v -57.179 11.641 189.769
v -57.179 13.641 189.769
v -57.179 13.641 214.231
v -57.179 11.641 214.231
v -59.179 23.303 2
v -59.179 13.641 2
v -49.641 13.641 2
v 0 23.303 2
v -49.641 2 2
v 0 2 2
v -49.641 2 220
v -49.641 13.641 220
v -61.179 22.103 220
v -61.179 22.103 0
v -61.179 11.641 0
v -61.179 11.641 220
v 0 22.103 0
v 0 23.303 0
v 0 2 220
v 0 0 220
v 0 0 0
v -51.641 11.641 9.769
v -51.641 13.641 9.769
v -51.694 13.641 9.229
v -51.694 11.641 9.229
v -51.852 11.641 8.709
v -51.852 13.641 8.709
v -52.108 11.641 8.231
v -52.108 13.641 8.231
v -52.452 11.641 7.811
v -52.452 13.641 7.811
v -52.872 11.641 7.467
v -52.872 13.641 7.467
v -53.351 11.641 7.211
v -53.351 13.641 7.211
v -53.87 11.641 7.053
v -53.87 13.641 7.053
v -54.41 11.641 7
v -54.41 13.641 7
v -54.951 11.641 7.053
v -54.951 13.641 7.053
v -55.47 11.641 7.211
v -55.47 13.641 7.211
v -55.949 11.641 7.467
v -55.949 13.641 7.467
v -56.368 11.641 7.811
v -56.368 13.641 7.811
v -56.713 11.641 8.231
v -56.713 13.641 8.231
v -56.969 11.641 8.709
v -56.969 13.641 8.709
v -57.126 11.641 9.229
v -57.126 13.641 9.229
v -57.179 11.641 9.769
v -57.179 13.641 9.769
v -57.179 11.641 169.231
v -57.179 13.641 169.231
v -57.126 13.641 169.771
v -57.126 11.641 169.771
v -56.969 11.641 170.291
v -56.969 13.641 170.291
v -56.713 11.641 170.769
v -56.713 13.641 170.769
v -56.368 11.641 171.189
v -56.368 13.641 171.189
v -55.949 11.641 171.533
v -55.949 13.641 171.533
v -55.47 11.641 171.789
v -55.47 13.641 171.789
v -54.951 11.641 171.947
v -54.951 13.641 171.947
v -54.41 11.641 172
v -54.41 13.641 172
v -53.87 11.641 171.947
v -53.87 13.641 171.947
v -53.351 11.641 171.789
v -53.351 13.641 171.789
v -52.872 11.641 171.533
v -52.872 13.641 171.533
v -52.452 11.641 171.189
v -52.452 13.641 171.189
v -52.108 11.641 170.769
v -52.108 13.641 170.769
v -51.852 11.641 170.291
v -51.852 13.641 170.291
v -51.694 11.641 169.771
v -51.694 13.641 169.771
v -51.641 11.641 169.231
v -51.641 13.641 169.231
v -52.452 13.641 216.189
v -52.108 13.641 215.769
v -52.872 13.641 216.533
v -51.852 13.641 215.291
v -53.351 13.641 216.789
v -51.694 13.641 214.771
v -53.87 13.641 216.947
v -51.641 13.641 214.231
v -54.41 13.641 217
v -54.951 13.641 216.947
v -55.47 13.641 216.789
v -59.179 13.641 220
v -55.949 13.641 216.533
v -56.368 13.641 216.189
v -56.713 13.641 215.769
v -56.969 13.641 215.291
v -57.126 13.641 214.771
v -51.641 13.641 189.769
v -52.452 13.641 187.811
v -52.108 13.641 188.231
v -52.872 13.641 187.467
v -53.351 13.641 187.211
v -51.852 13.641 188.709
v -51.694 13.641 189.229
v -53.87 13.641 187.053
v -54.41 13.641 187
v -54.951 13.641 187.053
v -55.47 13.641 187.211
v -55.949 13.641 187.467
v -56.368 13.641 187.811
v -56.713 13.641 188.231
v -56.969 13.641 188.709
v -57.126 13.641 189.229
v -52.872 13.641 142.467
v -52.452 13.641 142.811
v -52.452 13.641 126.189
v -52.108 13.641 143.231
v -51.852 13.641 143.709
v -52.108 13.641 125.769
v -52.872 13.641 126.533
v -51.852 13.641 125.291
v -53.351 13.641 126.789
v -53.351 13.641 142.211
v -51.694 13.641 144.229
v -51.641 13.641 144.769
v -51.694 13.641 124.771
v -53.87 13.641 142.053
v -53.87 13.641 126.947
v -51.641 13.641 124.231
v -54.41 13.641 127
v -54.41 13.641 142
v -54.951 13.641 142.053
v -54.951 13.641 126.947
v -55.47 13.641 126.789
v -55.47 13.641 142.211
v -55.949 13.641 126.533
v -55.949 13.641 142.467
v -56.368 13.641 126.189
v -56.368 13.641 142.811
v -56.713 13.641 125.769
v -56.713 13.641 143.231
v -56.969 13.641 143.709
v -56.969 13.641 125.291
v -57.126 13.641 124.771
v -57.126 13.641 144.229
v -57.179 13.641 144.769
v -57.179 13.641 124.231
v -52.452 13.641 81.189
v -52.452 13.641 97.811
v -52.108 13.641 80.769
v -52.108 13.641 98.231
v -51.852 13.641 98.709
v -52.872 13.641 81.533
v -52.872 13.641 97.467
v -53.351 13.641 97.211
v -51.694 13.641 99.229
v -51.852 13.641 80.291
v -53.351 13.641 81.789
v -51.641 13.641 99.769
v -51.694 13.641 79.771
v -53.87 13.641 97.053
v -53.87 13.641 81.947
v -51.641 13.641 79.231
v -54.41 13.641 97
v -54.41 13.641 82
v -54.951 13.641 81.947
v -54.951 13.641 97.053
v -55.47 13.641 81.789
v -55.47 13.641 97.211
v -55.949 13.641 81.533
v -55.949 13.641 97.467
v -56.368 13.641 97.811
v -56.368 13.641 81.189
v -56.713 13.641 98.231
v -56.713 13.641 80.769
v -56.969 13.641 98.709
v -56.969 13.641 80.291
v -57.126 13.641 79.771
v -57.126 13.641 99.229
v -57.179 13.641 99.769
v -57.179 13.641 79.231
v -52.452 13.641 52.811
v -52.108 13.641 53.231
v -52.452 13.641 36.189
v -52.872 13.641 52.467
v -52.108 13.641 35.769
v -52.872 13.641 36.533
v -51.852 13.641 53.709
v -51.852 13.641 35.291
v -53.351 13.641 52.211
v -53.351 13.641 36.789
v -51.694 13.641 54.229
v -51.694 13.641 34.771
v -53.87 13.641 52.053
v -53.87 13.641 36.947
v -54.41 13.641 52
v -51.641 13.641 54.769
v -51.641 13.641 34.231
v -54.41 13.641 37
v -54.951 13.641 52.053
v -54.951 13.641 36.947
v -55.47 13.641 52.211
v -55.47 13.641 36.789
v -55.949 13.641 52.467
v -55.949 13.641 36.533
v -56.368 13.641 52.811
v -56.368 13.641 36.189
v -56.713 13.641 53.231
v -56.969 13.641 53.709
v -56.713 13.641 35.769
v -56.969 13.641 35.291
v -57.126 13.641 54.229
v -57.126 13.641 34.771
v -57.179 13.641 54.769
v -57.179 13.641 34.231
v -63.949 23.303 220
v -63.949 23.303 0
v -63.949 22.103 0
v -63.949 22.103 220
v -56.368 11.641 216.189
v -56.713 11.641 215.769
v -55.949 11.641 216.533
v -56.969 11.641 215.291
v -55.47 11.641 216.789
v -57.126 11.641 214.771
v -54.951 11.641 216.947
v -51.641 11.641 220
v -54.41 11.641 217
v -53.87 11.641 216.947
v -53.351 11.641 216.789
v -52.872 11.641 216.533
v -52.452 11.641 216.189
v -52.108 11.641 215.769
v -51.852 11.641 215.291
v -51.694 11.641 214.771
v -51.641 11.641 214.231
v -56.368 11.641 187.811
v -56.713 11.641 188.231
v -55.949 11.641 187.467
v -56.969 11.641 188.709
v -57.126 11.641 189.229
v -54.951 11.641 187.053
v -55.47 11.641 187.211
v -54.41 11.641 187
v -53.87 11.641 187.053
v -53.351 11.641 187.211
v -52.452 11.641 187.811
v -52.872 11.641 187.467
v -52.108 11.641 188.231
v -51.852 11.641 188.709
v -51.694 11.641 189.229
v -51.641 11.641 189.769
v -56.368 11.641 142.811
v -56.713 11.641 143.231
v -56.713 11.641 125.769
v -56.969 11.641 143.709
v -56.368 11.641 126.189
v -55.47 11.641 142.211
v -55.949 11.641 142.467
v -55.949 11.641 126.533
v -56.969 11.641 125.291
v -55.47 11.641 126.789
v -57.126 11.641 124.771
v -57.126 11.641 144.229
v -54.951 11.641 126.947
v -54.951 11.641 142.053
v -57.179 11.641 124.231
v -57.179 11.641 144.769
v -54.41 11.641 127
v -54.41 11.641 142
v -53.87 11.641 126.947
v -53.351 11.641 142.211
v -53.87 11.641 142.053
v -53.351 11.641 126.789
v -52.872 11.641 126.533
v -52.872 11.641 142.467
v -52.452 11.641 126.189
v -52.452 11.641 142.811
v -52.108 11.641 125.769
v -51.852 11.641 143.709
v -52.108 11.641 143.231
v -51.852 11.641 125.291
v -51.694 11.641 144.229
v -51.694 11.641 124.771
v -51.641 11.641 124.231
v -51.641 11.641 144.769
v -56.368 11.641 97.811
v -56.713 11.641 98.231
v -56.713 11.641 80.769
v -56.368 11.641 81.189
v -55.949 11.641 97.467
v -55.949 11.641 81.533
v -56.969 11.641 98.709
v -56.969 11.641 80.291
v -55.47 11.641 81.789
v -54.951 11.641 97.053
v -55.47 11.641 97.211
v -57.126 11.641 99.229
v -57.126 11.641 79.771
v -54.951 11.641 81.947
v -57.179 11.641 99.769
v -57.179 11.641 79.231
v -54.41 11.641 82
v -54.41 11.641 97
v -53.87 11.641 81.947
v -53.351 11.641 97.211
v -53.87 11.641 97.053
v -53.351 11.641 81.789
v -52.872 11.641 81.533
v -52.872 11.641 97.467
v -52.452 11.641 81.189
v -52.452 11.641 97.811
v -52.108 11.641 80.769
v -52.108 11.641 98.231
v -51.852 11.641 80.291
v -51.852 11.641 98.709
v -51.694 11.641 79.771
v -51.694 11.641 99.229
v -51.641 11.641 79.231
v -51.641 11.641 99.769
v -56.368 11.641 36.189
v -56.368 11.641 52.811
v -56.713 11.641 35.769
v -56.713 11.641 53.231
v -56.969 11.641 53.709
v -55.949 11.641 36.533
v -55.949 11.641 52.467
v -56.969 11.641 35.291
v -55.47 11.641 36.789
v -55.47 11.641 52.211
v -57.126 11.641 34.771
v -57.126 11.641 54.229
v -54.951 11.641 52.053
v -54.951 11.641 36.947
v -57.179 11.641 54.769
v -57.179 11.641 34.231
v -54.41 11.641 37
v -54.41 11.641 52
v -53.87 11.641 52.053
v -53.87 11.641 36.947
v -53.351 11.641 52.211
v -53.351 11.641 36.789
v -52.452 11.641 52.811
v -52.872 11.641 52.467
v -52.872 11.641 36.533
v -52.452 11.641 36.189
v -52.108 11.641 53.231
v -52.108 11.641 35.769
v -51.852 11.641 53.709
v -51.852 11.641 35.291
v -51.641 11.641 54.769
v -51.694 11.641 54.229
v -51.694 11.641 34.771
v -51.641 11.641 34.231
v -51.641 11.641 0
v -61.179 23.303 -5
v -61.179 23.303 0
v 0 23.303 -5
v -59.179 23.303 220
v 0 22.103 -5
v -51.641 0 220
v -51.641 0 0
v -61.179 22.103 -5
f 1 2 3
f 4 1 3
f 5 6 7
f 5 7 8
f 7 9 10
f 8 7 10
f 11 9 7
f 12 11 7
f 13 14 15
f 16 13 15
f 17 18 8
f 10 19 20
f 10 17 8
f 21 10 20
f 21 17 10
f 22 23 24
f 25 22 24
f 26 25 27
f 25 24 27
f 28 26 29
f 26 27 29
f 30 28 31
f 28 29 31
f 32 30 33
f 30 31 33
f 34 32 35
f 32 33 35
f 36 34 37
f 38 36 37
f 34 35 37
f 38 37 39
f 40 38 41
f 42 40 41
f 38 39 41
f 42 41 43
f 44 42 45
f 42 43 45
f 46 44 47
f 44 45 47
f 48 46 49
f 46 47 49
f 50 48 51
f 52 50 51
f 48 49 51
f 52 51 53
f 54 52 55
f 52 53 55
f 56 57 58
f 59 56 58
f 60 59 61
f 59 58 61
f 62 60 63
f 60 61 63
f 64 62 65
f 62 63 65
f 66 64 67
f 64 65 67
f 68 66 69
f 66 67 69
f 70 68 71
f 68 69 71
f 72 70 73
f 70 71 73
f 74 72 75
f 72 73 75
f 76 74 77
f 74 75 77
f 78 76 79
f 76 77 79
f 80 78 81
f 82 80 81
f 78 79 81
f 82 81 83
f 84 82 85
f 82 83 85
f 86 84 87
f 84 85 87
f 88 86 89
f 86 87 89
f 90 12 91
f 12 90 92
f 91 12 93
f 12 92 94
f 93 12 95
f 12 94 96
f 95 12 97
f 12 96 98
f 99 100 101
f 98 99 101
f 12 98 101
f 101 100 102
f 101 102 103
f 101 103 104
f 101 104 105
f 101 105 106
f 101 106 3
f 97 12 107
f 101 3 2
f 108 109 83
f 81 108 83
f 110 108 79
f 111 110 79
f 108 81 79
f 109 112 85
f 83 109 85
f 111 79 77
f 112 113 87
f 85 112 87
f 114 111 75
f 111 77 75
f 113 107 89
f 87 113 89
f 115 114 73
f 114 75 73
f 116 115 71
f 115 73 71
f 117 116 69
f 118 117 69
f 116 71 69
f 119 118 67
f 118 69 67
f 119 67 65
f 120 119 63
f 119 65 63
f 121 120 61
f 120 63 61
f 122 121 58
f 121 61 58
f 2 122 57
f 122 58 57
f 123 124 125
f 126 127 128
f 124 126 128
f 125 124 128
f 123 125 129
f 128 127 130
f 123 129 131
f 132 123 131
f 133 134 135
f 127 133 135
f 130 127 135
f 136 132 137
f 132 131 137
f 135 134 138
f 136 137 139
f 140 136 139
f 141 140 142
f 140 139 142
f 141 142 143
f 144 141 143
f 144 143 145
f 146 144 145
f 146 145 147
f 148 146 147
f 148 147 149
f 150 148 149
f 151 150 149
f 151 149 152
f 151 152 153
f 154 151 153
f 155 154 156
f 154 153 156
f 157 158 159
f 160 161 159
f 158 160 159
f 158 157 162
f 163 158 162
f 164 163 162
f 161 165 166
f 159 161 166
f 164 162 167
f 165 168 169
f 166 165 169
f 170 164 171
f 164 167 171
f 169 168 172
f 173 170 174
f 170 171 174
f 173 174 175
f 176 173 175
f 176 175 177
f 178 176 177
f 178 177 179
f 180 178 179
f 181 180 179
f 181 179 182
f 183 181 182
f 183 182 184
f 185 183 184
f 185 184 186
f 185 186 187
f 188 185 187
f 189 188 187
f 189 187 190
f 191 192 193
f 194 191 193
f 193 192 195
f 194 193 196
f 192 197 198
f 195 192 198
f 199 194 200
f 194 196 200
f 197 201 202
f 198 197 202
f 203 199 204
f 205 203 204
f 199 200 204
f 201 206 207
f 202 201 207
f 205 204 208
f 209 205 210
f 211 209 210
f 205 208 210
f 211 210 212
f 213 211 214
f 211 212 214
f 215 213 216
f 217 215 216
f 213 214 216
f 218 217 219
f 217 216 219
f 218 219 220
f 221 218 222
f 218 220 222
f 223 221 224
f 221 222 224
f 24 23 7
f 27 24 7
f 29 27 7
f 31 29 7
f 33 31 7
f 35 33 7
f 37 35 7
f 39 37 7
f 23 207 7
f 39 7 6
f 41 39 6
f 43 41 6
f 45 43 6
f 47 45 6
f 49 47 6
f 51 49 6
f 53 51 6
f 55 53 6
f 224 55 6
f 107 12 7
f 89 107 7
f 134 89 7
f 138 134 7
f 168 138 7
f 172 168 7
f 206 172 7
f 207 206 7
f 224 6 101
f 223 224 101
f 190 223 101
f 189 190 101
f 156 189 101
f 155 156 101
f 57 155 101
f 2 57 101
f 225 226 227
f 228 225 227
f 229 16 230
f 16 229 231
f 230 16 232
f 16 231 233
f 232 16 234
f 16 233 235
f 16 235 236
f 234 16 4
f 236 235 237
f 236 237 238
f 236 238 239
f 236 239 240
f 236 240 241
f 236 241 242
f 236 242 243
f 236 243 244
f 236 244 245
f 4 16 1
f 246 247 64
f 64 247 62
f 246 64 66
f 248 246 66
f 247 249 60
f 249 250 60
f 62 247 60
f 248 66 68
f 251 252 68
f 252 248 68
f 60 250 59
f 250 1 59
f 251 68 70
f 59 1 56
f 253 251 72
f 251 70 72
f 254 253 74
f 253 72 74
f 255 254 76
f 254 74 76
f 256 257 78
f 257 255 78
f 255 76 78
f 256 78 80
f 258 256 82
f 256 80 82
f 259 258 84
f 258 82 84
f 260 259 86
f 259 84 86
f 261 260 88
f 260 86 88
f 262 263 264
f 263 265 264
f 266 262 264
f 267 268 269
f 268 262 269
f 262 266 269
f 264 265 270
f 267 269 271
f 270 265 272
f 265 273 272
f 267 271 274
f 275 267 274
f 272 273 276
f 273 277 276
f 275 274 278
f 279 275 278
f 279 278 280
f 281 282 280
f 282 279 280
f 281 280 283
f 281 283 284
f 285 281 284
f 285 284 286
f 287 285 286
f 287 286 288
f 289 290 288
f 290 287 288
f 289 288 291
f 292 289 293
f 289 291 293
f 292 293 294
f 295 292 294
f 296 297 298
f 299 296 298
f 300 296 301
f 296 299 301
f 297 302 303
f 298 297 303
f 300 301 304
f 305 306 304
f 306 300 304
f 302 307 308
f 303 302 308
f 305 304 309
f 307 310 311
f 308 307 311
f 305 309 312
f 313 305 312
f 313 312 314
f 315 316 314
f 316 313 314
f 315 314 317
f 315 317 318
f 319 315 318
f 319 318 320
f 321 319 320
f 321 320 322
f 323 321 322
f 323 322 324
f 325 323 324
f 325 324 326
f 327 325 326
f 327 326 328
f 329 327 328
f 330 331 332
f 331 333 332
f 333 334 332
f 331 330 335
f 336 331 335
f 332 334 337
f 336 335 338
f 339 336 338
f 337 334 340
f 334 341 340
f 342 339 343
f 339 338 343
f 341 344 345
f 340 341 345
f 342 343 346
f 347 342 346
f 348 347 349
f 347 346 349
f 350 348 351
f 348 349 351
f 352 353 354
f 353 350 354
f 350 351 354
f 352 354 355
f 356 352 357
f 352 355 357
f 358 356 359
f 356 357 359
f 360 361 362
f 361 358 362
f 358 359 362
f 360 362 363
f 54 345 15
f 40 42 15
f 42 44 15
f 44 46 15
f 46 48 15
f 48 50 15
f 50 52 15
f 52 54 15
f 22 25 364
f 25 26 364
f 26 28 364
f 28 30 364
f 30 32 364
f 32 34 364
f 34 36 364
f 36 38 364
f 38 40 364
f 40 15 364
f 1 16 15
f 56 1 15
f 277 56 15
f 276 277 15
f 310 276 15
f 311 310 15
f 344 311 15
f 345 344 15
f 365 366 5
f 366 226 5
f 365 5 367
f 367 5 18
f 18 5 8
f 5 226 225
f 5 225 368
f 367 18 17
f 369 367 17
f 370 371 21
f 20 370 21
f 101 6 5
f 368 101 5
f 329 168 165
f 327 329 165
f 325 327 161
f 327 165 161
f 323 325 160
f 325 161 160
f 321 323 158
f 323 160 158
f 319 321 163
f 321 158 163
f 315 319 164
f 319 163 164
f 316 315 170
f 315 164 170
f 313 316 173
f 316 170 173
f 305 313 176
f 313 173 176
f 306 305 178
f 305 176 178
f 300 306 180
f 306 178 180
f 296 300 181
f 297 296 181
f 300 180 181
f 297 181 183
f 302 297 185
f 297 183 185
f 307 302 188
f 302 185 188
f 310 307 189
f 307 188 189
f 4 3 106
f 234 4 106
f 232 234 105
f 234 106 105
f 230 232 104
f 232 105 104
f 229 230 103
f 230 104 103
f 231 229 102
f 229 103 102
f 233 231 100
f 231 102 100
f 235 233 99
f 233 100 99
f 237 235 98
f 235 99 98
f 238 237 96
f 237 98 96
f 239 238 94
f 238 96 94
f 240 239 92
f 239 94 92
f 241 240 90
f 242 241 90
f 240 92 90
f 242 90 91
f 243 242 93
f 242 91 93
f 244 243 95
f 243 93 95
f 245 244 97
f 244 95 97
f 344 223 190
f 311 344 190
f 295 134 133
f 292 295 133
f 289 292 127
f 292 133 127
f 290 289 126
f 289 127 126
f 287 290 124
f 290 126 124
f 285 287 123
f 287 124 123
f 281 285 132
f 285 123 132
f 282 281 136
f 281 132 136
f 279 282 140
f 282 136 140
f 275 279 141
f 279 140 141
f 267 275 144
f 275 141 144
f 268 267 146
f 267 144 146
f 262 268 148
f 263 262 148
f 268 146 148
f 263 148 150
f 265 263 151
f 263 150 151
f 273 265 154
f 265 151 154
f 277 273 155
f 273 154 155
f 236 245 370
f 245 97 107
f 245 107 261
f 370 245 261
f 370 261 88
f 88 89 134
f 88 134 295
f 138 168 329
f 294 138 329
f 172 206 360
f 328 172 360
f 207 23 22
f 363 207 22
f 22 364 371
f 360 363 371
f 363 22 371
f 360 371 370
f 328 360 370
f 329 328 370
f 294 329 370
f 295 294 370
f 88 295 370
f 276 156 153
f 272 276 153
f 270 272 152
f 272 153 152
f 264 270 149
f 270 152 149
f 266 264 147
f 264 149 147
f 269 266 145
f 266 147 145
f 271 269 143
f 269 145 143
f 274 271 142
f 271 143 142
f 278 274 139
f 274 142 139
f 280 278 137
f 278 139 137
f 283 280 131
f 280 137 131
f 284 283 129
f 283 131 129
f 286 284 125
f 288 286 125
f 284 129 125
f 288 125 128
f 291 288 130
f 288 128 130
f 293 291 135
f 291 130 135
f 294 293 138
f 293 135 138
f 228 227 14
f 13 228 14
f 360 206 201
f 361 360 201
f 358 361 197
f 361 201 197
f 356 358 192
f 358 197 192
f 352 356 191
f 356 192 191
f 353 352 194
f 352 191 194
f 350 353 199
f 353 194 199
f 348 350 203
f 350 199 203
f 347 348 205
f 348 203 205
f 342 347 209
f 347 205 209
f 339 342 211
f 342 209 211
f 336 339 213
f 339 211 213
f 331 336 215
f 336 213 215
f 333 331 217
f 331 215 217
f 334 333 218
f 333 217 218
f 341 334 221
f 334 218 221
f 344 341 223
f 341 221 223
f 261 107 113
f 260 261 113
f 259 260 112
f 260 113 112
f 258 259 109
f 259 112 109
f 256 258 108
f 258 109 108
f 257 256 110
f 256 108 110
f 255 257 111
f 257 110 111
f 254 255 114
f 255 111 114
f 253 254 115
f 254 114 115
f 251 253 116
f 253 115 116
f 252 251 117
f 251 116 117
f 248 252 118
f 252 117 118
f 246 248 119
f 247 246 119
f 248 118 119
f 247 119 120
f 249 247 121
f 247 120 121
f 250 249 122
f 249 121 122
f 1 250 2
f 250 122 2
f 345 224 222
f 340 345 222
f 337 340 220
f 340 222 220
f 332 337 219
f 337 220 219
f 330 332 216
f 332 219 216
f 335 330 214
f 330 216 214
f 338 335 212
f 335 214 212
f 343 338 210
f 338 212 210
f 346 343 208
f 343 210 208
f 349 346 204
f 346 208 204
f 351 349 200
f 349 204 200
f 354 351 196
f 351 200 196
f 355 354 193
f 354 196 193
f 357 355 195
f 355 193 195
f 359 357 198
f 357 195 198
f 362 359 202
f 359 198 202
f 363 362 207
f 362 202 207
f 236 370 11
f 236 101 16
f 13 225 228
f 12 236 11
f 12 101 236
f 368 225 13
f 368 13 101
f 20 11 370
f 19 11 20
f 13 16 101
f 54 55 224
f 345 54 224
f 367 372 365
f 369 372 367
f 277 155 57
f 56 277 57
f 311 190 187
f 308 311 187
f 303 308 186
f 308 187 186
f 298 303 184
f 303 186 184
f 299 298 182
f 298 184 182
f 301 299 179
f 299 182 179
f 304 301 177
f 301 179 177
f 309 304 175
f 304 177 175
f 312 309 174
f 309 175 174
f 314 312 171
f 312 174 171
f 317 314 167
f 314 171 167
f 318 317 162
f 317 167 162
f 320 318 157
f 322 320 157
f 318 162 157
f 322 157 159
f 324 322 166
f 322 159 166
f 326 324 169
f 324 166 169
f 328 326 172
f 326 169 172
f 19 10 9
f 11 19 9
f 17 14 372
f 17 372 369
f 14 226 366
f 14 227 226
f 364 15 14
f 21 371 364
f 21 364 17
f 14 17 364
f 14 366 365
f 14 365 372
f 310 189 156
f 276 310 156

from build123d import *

# Parameters (mm, degrees)
F1_DEPTH = 220
F3_DEPTH = 2
F5_DEPTH = 2
F6_W     = 61.179483
F6_H     = 1.2
F7_DEPTH = 5


with BuildPart() as f1:
    # F0 (on Top) → F1 (new body)
    with BuildSketch(Plane.XY):
        Polygon((-51.641022, 0), (0, 0), (0, 2), (-49.641022, 2), (-49.641022, 13.641025), (-59.179483, 13.641025), (-59.179483, 23.302566), (-63.948719, 23.302566), (-63.948719, 22.102566), (-61.179483, 22.102566), (-61.179483, 11.641025), (-51.641022, 11.641025), align=None)
    extrude(amount=F1_DEPTH)

    # F2 (on face) → F3 (cut, through all)
    with BuildSketch(Plane(origin=(0, 13.641025, 0), x_dir=(-1, 0, 0), z_dir=(0, 1, 0))):
        with BuildLine():
            Line((57.179483, 189.76923), (57.179483, 214.23077))
            ThreePointArc((57.179483, 214.23077), (54.410253, 217), (51.641022, 214.23077))
            Line((51.641022, 214.23077), (51.641022, 189.76923))
            ThreePointArc((51.641022, 189.76923), (54.410253, 187), (57.179483, 189.76923))
        make_face()
        with BuildLine():
            Line((57.179483, 144.76923), (57.179483, 169.23077))
            ThreePointArc((57.179483, 169.23077), (54.410253, 172), (51.641022, 169.23077))
            Line((51.641022, 169.23077), (51.641022, 144.76923))
            ThreePointArc((51.641022, 144.76923), (54.410253, 142), (57.179483, 144.76923))
        make_face()
        with BuildLine():
            Line((57.179483, 99.76923), (57.179483, 124.23077))
            ThreePointArc((57.179483, 124.23077), (54.410253, 127), (51.641022, 124.23077))
            Line((51.641022, 124.23077), (51.641022, 99.76923))
            ThreePointArc((51.641022, 99.76923), (54.410253, 97), (57.179483, 99.76923))
        make_face()
        with BuildLine():
            Line((57.179483, 54.76923), (57.179483, 79.23077))
            ThreePointArc((57.179483, 79.23077), (54.410253, 82), (51.641022, 79.23077))
            Line((51.641022, 79.23077), (51.641022, 54.76923))
            ThreePointArc((51.641022, 54.76923), (54.410253, 52), (57.179483, 54.76923))
        make_face()
        with BuildLine():
            Line((57.179483, 9.76923), (57.179483, 34.23077))
            ThreePointArc((57.179483, 34.23077), (54.410253, 37), (51.641022, 34.23077))
            Line((51.641022, 34.23077), (51.641022, 9.76923))
            ThreePointArc((51.641022, 9.76923), (54.410253, 7), (57.179483, 9.76923))
        make_face()
    extrude(amount=-F3_DEPTH, mode=Mode.SUBTRACT)

    # F4 (on face) → F5 (join)
    with BuildSketch(Plane(origin=(0, 0, 0), x_dir=(1, 0, 0), z_dir=(0, 0, -1))):
        Polygon((-59.179483, -13.641025), (-59.179483, -23.302566), (0, -23.302566), (0, -2), (-49.641022, -2), (-49.641022, -13.641025), align=None)
    extrude(amount=-F5_DEPTH)

    # F6 (on face) → F7 (join)
    with BuildSketch(Plane(origin=(0, 0, 0), x_dir=(1, 0, 0), z_dir=(0, 0, -1))):
        with Locations((-30.589741, -22.702566)):
            Rectangle(F6_W, F6_H)
    extrude(amount=F7_DEPTH)


solid = f1.part
